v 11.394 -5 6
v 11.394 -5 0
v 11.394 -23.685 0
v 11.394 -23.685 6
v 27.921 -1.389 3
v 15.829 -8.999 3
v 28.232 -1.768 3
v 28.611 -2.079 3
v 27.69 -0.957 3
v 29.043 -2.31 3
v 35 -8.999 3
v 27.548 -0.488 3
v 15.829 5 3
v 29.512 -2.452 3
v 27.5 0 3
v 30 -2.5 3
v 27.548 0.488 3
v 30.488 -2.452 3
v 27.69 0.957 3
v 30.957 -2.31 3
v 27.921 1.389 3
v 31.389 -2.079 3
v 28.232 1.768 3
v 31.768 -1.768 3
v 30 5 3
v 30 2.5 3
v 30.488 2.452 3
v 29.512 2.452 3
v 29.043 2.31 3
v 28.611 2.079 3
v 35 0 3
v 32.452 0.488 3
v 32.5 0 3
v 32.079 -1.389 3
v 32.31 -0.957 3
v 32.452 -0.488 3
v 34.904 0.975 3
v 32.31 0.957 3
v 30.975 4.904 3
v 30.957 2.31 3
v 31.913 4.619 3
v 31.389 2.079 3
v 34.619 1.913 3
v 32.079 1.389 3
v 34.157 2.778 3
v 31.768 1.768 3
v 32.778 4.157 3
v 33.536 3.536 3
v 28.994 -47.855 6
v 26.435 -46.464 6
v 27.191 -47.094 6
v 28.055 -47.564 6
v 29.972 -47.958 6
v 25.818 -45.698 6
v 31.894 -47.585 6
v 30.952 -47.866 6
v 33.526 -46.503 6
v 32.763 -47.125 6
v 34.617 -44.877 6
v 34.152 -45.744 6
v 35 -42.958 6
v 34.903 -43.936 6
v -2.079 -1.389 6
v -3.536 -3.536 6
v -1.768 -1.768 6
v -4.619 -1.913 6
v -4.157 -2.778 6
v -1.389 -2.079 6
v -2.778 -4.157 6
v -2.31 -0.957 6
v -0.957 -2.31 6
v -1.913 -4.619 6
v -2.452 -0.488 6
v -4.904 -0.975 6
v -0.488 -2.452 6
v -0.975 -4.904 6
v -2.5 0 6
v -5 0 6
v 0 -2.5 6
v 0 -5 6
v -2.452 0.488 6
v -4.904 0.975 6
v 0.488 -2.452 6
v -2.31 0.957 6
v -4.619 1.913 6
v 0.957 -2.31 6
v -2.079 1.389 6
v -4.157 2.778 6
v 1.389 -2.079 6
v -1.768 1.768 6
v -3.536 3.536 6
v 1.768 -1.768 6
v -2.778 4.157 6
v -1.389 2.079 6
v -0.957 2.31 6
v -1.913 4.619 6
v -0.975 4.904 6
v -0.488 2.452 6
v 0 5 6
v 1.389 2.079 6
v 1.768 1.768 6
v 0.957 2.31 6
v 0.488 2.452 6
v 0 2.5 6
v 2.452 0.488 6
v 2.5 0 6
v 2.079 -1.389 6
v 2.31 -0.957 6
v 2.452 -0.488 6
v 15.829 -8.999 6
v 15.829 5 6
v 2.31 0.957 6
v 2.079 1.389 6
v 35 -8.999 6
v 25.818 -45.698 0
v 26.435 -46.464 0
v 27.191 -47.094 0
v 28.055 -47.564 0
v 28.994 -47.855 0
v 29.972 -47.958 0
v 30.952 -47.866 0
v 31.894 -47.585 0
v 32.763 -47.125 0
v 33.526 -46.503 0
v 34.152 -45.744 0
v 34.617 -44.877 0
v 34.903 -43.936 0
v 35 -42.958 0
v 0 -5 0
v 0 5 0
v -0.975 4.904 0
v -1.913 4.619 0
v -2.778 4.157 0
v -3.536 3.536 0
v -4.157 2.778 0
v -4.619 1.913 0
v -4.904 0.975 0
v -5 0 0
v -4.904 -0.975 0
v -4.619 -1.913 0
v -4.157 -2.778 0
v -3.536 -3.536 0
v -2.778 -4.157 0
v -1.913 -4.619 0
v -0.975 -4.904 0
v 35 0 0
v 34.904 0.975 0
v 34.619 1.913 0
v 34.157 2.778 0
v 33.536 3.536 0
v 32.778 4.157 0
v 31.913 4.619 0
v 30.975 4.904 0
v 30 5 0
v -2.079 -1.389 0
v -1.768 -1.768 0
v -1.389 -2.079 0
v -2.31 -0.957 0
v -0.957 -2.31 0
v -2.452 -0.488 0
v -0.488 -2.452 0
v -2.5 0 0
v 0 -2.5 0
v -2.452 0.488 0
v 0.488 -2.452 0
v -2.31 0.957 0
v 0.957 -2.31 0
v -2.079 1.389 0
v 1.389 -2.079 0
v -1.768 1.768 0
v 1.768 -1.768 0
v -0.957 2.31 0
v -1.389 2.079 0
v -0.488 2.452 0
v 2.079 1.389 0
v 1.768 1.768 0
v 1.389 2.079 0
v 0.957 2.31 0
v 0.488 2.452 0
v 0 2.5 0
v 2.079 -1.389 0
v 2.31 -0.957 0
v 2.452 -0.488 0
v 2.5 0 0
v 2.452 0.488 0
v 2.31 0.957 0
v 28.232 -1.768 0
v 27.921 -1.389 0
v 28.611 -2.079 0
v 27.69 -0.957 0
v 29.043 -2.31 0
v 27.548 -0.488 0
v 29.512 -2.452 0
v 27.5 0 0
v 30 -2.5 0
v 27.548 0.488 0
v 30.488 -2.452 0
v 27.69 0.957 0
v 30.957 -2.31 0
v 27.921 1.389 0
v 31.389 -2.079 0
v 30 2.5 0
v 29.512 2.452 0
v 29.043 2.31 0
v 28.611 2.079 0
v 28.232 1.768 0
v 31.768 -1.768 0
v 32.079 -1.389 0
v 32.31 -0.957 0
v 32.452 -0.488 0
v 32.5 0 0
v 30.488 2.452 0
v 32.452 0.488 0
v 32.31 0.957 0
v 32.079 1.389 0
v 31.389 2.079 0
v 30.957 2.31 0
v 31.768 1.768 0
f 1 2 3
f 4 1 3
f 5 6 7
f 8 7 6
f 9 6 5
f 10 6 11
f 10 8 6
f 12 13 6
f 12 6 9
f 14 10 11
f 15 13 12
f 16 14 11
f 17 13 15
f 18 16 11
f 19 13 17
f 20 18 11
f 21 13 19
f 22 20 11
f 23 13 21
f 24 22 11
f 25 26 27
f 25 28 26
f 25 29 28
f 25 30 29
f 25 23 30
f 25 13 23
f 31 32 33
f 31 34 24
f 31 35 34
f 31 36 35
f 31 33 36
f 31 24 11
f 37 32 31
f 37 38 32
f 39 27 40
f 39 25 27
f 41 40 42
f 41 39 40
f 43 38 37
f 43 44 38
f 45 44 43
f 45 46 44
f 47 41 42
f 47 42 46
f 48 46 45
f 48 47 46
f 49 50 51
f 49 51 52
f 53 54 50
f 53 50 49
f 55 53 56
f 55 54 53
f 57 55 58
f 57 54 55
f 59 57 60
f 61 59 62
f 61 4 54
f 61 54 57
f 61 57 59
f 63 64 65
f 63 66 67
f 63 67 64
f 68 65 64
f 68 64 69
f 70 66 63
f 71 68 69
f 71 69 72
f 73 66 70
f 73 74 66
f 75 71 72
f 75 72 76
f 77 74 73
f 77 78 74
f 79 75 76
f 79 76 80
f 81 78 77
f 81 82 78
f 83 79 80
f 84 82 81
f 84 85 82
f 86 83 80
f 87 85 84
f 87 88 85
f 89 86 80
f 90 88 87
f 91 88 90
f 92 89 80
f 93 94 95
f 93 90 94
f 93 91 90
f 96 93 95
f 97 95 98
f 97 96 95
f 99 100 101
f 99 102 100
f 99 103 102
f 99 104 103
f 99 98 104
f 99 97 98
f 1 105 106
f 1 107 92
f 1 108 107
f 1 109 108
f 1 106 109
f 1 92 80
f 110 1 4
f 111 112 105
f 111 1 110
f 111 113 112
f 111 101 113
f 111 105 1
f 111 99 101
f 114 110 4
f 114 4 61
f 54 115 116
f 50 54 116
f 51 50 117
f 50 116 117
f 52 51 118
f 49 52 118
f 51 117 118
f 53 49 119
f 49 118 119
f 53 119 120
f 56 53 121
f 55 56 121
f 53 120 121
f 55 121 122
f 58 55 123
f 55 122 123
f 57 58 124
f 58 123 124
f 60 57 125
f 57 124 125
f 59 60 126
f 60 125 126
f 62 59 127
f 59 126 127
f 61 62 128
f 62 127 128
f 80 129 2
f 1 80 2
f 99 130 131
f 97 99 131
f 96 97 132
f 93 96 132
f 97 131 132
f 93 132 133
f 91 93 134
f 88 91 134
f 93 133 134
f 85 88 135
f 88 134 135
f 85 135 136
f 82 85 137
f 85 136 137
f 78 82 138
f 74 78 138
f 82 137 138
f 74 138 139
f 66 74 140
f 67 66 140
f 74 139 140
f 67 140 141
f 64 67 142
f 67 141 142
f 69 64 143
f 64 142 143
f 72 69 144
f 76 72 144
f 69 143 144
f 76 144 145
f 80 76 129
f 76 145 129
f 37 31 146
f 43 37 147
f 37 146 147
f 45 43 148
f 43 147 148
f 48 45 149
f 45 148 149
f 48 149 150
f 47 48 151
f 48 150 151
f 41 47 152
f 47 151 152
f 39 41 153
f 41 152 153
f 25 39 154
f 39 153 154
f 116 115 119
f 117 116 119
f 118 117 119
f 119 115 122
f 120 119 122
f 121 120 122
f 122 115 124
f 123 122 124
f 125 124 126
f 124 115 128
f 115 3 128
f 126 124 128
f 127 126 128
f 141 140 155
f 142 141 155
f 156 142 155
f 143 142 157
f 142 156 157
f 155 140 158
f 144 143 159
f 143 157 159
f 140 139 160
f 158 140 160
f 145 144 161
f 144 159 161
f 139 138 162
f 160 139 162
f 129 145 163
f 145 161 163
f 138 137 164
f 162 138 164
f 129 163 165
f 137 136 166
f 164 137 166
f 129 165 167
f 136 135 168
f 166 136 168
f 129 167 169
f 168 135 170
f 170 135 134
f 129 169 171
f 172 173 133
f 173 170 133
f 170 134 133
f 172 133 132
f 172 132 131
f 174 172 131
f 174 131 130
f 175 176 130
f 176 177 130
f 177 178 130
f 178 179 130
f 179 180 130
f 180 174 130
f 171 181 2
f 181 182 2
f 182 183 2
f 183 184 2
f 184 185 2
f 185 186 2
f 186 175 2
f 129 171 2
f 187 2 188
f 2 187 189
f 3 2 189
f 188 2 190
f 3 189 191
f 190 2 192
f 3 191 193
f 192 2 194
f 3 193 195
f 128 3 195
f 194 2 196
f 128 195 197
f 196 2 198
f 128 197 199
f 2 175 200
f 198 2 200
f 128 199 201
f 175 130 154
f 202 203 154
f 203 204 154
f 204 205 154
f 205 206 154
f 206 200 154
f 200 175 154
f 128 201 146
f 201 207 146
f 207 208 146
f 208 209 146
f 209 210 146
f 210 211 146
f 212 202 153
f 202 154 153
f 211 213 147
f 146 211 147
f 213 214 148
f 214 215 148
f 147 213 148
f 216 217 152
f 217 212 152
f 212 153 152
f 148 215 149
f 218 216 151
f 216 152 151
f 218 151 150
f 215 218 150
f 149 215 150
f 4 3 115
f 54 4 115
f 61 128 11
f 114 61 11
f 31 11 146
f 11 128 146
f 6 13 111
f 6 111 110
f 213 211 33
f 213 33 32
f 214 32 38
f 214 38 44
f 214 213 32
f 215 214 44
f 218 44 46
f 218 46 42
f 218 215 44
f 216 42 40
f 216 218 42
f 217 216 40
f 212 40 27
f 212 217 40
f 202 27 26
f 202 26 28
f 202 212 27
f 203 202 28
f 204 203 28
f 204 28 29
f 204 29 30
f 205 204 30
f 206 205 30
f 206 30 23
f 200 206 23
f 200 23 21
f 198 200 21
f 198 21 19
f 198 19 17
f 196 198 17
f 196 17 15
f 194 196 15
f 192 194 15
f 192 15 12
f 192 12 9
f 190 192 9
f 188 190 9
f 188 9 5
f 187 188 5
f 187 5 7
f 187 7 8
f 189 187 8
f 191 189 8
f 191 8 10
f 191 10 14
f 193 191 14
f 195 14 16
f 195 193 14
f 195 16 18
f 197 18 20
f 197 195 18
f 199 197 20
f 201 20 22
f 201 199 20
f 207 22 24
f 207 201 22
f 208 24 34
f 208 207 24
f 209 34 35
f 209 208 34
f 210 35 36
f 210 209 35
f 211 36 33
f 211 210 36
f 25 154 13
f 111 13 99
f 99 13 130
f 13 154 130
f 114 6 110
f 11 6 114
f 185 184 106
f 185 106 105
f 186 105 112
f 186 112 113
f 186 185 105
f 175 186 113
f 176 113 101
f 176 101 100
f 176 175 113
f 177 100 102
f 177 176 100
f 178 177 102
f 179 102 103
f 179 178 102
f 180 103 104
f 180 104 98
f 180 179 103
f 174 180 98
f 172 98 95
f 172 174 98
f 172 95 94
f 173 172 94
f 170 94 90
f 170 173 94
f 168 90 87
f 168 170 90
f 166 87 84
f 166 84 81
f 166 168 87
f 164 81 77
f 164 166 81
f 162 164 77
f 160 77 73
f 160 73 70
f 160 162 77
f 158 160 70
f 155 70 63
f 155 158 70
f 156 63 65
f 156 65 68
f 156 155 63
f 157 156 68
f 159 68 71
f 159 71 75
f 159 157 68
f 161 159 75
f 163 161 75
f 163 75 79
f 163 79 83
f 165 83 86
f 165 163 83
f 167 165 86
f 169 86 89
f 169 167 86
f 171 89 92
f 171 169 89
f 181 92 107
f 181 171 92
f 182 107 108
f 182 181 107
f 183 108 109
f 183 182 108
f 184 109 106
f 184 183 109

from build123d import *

# Parameters (mm, degrees)
SKETCH1_R               = 2.5
BOSS_EXTRUDE1_DEPTH     = 6
CUT_EXTRUDE1_DEPTH      = 60.673537378
CUT_EXTRUDE1_DEPTH_BACK = 3
SKETCH2_R               = 2.5


with BuildPart() as part:
    # Sketch1 → Boss-Extrude1 (new body)
    # profile 1 of 2: a face of its own
    with BuildSketch(Plane.XY):
        with BuildLine():
            ThreePointArc((30, -5), (35, 0), (30, 5))
            Line((30, 5), (0, 5))
            ThreePointArc((0, 5), (-5, 0), (0, -5))
            Line((0, -5), (30, -5))
        make_face()
        with Locations((30, 0)):
            Circle(SKETCH1_R, mode=Mode.SUBTRACT)
        Circle(SKETCH1_R, mode=Mode.SUBTRACT)
    # profile 2 of 2: a face of its own
    with BuildSketch(Plane.XY):
        with BuildLine():
            Line((35, -42.957596512), (35, 0))
            ThreePointArc((35, 0), (33.535533906, -3.535533906), (30, -5))
            Line((30, -5), (11.394465816, -5))
            Line((11.394465816, -5), (11.394465816, -23.685159648))
            Line((11.394465816, -23.685159648), (25.817798964, -45.697887462))
            ThreePointArc((25.817798964, -45.697887462), (31.429859227, -47.748786613), (35, -42.957596512))
        make_face()
    extrude(amount=BOSS_EXTRUDE1_DEPTH)

    # Sketch2 → Cut-Extrude1 (cut, two sides: drawn at the far end of the back side and taken through both)
    with BuildSketch(Plane.XY.offset(6).offset(-CUT_EXTRUDE1_DEPTH_BACK)):
        with BuildLine():
            Line((30, 5), (15.828754387, 5))
            Line((15.828754387, 5), (15.828754387, -8.999149352))
            Line((15.828754387, -8.999149352), (35, -8.999149352))
            Line((35, -8.999149352), (35, 0))
            ThreePointArc((35, 0), (33.535533906, 3.535533906), (30, 5))
        make_face()
        with Locations((30, 0)):
            Circle(SKETCH2_R, mode=Mode.SUBTRACT)
    extrude(amount=CUT_EXTRUDE1_DEPTH + CUT_EXTRUDE1_DEPTH_BACK, mode=Mode.SUBTRACT)


solid = part.part
